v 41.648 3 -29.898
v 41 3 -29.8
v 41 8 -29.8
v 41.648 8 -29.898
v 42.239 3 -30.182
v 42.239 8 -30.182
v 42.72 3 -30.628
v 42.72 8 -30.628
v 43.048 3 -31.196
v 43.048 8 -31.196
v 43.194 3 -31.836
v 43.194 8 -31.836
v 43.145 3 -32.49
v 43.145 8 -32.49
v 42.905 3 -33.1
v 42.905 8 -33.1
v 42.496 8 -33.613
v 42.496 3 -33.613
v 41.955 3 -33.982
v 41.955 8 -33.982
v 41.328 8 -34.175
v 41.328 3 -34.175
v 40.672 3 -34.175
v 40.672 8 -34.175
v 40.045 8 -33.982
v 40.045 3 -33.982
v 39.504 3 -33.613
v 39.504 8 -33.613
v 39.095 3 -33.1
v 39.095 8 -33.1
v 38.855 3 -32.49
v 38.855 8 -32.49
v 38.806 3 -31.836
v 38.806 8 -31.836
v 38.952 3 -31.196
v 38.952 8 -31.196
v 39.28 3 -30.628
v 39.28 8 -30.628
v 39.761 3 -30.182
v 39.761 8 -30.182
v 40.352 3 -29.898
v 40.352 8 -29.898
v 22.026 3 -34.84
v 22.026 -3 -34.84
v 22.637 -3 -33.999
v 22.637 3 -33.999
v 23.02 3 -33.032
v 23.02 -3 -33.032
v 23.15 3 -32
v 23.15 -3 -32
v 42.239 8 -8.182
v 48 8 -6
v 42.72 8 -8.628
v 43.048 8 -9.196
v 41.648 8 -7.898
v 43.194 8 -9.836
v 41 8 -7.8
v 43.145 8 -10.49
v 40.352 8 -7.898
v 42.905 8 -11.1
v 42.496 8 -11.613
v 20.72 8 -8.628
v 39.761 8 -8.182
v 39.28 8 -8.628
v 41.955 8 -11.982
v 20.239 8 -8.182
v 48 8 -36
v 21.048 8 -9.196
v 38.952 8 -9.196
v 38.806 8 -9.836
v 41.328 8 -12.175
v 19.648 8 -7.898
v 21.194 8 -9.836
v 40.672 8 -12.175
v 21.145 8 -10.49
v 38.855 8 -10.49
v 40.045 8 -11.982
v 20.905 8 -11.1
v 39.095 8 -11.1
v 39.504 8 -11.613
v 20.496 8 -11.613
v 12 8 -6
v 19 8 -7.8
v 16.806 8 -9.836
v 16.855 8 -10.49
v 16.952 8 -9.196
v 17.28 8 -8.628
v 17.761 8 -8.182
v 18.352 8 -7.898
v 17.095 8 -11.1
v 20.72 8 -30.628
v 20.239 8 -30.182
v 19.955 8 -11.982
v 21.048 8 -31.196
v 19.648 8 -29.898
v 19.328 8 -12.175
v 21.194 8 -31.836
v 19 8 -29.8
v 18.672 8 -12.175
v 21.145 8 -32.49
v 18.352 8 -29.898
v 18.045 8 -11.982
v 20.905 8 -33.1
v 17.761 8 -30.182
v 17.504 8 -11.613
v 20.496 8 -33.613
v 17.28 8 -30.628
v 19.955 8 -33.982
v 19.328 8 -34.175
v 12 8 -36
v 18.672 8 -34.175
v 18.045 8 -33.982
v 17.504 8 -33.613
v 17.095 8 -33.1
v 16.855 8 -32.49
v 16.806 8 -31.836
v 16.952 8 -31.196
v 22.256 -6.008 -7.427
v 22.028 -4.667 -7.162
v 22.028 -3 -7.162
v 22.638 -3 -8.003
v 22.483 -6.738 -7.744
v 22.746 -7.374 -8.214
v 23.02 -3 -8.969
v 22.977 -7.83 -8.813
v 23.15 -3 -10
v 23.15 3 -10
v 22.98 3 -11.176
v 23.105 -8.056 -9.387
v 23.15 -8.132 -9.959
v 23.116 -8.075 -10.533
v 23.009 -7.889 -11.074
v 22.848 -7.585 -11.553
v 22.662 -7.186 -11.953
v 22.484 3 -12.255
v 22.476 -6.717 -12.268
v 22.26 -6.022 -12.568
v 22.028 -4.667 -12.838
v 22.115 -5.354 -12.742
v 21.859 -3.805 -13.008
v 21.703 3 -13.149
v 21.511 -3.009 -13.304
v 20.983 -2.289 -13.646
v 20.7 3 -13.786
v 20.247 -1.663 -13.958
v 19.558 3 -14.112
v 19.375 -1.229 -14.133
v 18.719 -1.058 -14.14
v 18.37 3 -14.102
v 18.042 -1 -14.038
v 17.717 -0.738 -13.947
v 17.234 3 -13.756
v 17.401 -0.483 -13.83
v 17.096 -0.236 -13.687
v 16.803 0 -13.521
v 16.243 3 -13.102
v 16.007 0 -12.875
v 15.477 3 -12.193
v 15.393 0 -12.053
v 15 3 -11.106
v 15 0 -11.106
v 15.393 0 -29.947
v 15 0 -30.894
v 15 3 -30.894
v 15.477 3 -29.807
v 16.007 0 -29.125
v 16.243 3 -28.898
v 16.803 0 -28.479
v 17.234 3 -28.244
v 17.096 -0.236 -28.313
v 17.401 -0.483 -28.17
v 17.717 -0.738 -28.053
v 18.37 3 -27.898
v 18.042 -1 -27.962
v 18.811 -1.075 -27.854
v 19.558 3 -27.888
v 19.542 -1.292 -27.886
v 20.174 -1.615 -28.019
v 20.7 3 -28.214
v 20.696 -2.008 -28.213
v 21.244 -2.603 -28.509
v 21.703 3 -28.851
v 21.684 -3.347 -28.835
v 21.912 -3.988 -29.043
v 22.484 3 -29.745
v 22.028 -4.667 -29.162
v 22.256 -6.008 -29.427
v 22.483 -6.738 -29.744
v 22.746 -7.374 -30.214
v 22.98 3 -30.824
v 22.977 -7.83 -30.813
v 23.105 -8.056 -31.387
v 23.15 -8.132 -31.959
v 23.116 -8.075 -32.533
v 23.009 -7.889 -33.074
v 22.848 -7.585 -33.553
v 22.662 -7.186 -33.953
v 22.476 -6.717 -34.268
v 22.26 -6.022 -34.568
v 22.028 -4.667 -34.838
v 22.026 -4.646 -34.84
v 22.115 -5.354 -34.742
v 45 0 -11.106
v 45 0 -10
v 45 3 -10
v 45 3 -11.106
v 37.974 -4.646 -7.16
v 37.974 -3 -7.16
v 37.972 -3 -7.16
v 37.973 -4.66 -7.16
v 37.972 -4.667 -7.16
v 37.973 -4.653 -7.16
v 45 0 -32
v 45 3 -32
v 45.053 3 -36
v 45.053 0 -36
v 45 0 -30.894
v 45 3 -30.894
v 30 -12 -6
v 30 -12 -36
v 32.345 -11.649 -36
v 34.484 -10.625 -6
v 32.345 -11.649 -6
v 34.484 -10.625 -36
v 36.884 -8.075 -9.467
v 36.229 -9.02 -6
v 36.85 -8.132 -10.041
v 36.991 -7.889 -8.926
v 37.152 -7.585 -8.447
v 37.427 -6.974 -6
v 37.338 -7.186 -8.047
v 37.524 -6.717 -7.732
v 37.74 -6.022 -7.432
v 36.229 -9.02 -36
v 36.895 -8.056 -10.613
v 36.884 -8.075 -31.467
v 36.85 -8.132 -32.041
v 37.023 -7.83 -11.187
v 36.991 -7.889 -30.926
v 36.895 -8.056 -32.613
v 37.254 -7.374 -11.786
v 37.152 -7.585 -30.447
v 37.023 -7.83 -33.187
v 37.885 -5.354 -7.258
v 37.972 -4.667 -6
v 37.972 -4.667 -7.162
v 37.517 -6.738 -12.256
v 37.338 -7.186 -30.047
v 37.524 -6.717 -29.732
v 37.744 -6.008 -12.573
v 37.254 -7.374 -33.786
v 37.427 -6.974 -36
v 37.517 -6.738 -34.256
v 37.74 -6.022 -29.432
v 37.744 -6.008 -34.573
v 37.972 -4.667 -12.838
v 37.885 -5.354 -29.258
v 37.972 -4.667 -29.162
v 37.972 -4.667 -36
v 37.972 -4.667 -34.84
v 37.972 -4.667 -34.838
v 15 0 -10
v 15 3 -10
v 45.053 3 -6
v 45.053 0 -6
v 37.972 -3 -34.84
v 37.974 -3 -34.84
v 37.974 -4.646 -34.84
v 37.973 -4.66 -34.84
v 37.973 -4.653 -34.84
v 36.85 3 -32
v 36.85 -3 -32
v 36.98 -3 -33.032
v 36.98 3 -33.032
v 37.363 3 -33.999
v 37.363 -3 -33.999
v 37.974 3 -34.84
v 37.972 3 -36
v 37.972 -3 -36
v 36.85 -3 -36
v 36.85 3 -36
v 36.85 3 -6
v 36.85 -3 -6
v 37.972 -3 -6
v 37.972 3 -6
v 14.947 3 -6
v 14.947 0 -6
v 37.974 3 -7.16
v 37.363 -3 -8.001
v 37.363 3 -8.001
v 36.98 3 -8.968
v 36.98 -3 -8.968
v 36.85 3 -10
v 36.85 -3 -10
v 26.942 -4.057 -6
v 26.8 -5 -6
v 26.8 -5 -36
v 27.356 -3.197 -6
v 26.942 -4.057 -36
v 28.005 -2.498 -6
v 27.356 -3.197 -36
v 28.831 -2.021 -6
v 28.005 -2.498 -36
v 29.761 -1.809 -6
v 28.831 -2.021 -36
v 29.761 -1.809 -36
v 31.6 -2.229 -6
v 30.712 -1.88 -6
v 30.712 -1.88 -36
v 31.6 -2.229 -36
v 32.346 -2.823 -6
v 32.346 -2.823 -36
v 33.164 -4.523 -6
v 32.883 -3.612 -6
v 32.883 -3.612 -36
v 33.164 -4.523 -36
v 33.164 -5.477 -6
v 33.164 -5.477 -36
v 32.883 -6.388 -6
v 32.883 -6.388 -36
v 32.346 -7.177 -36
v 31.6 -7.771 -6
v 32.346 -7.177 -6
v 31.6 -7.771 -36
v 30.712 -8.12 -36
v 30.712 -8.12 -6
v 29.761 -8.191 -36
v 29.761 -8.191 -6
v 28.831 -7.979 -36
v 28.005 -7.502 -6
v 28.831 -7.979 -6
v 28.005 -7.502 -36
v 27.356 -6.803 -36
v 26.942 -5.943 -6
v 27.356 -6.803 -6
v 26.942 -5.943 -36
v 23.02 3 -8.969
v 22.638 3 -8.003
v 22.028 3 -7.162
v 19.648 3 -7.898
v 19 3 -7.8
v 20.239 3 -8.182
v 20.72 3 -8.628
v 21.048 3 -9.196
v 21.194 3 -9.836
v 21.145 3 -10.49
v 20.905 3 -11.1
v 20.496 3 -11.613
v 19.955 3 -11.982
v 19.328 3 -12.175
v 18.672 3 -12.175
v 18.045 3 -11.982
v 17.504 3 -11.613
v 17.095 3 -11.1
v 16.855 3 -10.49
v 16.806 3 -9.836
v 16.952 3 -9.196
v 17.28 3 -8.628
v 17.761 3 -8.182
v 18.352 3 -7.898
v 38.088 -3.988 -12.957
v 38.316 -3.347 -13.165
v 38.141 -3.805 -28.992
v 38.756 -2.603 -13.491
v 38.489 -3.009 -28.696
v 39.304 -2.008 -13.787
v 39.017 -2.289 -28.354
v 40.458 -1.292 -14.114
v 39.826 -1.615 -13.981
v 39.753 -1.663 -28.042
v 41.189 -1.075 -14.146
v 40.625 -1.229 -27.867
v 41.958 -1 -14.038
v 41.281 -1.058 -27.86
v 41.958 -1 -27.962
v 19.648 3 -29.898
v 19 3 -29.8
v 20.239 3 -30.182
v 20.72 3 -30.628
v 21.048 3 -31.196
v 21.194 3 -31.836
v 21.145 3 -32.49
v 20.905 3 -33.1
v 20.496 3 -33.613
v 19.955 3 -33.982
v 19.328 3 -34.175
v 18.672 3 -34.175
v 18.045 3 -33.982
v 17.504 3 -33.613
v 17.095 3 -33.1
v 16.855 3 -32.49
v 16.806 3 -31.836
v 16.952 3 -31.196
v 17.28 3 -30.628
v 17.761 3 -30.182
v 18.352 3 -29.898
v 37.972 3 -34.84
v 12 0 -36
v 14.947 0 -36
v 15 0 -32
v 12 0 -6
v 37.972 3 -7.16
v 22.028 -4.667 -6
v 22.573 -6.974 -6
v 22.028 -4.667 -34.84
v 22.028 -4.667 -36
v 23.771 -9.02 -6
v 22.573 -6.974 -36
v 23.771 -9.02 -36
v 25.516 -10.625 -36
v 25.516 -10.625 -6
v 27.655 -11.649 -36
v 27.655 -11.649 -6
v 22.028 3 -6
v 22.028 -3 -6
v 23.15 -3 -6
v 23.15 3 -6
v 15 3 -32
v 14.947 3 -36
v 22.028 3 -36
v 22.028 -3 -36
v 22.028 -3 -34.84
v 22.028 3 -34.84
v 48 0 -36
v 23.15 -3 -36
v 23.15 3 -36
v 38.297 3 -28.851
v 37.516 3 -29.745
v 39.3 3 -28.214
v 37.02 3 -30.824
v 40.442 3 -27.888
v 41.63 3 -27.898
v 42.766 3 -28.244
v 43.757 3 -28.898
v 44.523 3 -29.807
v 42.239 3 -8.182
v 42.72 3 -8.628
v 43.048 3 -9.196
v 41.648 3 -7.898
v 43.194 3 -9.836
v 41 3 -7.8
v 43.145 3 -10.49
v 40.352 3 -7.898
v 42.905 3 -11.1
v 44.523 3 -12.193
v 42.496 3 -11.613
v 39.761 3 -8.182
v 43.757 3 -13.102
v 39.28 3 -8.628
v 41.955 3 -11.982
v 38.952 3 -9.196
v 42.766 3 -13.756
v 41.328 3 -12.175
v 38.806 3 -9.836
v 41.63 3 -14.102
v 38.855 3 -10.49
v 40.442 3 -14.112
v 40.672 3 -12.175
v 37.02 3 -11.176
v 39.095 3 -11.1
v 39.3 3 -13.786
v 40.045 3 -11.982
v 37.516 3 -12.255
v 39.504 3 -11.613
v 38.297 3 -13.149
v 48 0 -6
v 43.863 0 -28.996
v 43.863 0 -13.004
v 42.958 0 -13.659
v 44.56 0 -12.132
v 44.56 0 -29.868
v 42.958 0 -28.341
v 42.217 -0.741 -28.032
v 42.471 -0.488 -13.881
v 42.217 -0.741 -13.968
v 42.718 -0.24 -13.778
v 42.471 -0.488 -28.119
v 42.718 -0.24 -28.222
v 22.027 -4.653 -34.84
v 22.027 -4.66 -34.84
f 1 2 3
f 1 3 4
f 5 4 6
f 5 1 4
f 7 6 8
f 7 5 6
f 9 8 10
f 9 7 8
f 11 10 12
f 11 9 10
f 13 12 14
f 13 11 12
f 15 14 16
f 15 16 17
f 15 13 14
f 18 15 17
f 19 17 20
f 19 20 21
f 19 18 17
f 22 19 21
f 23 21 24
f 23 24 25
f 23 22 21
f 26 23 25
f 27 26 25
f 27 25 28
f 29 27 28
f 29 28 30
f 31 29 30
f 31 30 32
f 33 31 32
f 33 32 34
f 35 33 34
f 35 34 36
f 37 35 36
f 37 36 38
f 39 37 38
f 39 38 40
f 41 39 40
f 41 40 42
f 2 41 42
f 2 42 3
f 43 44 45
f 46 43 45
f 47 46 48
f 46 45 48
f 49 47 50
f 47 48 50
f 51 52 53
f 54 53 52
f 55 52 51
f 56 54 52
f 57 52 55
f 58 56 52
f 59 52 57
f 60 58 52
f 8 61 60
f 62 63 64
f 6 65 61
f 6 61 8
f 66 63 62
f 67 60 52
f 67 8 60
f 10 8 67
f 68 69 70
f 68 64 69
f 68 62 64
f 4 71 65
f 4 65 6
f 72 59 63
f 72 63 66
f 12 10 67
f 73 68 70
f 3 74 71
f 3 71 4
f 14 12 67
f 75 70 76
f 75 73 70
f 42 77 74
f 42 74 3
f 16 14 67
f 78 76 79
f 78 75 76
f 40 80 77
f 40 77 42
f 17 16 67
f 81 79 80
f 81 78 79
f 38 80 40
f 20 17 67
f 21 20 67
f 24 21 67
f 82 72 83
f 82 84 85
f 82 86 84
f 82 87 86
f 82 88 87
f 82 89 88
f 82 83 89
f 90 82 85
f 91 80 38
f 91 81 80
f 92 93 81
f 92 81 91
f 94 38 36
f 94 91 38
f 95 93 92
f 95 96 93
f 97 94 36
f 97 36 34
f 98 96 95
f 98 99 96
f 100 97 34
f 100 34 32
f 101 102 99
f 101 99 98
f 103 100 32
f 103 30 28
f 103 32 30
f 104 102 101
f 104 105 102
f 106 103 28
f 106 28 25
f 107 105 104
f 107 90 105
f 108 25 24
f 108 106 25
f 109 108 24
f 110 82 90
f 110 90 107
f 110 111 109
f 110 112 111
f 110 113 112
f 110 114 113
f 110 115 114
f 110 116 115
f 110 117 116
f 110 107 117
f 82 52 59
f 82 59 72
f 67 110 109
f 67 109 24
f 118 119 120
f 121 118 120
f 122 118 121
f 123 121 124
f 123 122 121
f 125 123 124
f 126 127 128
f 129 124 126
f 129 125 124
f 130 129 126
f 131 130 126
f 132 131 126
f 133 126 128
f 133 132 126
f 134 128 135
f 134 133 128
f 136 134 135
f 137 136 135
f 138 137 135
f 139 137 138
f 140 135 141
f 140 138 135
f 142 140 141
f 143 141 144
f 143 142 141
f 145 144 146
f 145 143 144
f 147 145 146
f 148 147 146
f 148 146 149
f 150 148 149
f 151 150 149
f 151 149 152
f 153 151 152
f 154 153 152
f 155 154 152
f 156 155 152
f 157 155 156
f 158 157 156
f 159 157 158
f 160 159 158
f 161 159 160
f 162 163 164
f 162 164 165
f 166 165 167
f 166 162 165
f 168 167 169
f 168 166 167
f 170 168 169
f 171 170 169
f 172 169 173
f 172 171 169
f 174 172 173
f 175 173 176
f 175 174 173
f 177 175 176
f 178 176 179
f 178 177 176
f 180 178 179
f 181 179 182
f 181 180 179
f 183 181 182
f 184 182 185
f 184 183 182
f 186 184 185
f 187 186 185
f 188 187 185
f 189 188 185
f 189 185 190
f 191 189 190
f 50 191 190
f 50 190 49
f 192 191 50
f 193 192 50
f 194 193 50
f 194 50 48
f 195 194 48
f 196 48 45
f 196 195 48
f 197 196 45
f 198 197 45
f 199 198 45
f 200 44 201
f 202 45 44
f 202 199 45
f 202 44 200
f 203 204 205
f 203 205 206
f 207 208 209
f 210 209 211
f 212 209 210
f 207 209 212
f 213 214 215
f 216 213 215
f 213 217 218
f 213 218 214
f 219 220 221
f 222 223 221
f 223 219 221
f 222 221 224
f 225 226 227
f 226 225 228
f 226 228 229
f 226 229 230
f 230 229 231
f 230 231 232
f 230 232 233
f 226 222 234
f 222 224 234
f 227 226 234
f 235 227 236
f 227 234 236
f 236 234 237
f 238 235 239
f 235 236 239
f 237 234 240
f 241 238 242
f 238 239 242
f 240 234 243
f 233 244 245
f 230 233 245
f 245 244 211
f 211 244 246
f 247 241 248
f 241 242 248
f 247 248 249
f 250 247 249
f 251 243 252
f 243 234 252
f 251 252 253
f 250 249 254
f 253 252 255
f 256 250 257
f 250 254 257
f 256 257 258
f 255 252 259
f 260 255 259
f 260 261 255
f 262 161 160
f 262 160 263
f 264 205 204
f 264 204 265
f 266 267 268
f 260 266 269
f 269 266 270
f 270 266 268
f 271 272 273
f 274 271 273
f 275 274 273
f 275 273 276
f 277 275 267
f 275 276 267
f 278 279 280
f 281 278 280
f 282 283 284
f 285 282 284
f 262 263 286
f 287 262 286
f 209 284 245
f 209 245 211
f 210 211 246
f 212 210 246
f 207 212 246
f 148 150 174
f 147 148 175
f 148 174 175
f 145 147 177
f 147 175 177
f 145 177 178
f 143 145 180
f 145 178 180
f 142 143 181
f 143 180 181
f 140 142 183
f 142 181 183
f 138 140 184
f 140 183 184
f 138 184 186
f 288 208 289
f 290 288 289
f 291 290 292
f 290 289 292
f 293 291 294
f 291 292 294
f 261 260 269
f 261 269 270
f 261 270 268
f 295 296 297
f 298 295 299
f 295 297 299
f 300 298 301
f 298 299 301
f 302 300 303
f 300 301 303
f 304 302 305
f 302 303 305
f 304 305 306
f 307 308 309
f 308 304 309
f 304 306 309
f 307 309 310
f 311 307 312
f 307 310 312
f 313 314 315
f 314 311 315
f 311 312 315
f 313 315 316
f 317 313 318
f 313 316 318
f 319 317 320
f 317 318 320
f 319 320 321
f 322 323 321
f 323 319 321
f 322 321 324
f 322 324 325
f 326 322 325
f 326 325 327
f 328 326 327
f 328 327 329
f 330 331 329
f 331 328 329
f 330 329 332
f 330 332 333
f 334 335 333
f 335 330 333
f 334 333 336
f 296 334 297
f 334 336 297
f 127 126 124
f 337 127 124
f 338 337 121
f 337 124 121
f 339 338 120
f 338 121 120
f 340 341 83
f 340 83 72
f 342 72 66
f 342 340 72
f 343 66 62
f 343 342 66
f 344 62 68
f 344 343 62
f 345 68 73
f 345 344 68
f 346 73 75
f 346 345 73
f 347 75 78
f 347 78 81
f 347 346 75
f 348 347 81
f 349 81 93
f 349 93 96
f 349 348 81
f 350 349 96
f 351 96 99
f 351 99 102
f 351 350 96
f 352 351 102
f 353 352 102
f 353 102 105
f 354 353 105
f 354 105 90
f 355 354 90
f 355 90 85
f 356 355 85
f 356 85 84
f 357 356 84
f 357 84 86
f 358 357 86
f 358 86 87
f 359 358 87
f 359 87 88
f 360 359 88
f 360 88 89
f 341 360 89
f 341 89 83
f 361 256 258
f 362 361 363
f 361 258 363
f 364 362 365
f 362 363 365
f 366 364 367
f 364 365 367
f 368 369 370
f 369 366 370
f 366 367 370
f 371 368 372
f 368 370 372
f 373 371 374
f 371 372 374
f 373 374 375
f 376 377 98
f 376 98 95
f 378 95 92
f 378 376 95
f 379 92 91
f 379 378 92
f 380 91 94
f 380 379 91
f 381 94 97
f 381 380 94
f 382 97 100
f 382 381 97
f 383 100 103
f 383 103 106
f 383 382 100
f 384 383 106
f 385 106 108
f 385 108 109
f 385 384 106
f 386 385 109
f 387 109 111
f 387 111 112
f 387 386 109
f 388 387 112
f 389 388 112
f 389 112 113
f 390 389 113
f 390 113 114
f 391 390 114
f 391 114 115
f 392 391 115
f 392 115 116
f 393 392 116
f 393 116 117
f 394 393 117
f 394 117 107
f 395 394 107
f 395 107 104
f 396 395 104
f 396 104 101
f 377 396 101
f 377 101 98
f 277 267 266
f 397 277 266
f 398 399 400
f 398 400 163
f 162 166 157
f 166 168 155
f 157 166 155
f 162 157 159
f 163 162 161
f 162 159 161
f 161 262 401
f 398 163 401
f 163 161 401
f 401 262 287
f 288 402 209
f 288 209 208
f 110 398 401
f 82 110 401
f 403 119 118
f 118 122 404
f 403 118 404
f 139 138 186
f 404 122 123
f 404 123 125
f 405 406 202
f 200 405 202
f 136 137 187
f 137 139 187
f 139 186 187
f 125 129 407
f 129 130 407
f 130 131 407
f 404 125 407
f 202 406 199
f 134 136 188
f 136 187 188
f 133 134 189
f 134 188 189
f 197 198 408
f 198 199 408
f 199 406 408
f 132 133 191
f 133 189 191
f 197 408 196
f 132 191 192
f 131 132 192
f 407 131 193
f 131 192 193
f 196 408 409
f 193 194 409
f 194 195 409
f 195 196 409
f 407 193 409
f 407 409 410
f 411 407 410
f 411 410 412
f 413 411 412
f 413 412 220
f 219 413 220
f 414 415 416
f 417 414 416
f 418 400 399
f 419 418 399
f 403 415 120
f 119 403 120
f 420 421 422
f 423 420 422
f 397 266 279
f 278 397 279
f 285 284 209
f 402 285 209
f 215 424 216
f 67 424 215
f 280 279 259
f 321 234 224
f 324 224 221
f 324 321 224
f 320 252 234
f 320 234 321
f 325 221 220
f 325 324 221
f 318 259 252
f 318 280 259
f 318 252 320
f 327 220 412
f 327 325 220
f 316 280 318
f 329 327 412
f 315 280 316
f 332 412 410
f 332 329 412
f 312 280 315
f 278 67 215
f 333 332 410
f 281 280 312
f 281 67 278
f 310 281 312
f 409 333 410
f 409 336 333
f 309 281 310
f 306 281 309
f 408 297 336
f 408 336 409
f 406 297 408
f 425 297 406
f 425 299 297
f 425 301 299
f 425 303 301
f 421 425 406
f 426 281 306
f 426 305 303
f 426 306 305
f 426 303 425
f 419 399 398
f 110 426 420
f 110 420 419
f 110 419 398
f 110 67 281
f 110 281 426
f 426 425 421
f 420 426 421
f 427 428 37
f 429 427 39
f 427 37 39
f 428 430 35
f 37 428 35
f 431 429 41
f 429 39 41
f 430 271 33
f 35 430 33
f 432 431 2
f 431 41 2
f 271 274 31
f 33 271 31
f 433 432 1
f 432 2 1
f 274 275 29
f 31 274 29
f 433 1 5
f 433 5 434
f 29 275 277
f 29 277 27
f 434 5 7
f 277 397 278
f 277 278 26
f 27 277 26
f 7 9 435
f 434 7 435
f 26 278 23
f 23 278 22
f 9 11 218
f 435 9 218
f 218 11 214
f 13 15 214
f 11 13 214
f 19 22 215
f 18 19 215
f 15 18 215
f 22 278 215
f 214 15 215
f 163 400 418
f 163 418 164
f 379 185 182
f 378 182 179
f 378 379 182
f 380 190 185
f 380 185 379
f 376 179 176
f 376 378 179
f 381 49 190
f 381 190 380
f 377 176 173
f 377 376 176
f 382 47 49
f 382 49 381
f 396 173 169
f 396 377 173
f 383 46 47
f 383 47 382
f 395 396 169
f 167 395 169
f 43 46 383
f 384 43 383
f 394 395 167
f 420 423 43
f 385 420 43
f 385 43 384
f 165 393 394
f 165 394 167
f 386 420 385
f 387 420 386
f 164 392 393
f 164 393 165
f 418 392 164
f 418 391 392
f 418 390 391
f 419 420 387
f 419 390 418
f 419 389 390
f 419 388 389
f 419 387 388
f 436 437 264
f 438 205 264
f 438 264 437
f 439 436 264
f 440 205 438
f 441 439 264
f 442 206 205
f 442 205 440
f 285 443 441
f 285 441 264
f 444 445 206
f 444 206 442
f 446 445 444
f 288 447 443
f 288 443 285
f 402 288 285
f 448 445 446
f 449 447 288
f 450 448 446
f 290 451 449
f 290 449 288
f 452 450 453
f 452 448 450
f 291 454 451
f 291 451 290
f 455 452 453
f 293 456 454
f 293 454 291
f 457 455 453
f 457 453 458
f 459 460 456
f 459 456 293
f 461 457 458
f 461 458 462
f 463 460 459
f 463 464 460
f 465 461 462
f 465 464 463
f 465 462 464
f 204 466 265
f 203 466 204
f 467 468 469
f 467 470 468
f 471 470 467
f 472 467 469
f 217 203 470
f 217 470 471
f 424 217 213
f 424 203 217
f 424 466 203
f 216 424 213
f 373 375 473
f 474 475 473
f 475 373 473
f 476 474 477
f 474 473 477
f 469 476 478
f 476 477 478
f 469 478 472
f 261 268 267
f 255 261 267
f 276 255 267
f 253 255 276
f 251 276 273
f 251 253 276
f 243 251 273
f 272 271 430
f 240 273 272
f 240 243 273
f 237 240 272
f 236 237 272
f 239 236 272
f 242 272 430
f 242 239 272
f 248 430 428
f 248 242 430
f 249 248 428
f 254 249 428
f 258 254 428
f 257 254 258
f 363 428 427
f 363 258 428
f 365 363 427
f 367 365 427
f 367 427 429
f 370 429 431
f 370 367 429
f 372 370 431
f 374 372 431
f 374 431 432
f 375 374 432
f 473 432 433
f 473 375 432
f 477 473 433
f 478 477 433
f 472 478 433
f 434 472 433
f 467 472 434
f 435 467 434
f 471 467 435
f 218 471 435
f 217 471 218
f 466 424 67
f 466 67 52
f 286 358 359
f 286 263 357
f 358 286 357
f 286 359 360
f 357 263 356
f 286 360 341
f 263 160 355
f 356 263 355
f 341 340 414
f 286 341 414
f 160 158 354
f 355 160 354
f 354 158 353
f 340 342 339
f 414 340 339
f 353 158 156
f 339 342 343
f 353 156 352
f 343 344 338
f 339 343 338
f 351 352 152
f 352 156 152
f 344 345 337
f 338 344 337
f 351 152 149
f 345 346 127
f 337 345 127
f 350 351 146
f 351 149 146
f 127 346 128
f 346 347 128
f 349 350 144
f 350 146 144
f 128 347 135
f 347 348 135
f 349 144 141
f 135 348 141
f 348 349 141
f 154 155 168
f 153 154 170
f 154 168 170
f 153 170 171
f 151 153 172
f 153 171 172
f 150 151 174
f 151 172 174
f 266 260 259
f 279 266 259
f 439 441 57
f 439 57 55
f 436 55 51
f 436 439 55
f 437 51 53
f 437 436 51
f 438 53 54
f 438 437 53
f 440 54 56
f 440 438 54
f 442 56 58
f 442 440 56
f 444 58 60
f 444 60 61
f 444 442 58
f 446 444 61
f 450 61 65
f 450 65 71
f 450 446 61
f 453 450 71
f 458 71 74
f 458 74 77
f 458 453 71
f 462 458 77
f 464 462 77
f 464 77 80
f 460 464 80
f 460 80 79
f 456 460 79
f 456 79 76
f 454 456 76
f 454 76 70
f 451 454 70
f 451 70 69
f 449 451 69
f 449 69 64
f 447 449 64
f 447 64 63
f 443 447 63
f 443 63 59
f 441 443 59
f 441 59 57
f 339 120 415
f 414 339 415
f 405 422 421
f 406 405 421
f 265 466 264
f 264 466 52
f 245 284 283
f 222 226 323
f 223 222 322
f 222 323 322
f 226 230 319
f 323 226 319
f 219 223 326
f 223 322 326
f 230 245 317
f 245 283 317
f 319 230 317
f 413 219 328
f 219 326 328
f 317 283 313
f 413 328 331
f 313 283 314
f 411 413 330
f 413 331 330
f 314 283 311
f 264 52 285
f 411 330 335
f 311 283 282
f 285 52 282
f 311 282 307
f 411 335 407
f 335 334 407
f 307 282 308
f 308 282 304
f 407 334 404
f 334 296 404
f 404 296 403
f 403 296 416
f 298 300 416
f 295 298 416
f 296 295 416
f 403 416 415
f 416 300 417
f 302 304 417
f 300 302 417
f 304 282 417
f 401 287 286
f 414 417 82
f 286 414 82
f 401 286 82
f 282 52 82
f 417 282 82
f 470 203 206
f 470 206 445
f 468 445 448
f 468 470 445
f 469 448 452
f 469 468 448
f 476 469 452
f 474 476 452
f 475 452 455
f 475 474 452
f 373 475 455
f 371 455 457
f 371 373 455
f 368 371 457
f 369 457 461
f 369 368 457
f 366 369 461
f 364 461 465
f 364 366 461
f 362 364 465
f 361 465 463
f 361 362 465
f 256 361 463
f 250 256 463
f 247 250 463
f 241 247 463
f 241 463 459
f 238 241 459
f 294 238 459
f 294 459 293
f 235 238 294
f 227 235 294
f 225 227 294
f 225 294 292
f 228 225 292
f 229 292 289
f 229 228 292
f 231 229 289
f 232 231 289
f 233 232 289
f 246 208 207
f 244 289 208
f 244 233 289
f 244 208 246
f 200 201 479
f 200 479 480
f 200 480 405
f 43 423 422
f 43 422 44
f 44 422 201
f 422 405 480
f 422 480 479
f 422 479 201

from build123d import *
from build123d.topology import SkipClean

# Parameters (mm, degrees)
SKETCH1_W            = 60
SKETCH1_H            = 42
BOSS_EXTRUDE1_DEPTH  = 8
SKETCH3_W            = 10
SKETCH3_H            = 42
BOSS_EXTRUDE5_DEPTH  = 6
SKETCH5_W            = 14
SKETCH5_H            = 42
BOSS_EXTRUDE6_DEPTH  = 11
SKETCH6_R            = 3.2
CUT_EXTRUDE1_DEPTH   = 75.565407529
FILLET1_R            = 7
FILLET2_R            = 5
FILLET3_R            = 5
BOSS_EXTRUDE7_DEPTH  = 42
SKETCH9_W            = 5
SKETCH9_H            = 42
BOSS_EXTRUDE8_DEPTH  = 6
SKETCH11_W           = 15
SKETCH11_H           = 42
CUT_EXTRUDE2_DEPTH   = 76.921011584
SKETCH12_W           = 30
SKETCH12_H           = 42
CUT_EXTRUDE3_DEPTH   = 6
SKETCH15_W           = 42
SKETCH15_H           = 8
BOSS_EXTRUDE9_DEPTH  = 5
SKETCH16_W           = 42
SKETCH16_H           = 8
BOSS_EXTRUDE10_DEPTH = 5
CUT_EXTRUDE7_START   = -17
CUT_EXTRUDE7_DEPTH   = 17
BOSS_EXTRUDE11_START = -5
SKETCH17_R           = 4.15
SKETCH17_R_2         = 2.2
BOSS_EXTRUDE11_DEPTH = 5
SKETCH18_W           = 2
SKETCH18_H           = 42
CUT_EXTRUDE8_DEPTH   = 67.392770772
CUT_EXTRUDE9_START   = -6
SKETCH19_R           = 3.2
CUT_EXTRUDE9_DEPTH   = 6
CUT_EXTRUDE10_DEPTH  = 6
SKETCH21_W           = 6.443242803
SKETCH21_H           = 1.161907564
SKETCH21_W_2         = 5.84761327
SKETCH21_H_2         = 1.16
SKETCH21_W_3         = 6.146169824
CUT_EXTRUDE11_DEPTH  = 6
CUT_EXTRUDE12_DEPTH  = 3
BOSS_EXTRUDE12_DEPTH = 6
BOSS_EXTRUDE13_DEPTH = 6


with BuildPart() as part:
    # Sketch1 → Boss-Extrude1 (new body)
    with BuildSketch(Plane(origin=(0, 0, 0), x_dir=(1, 0, 0), z_dir=(0, 1, 0))):
        with Locations((30, 21)):
            Rectangle(SKETCH1_W, SKETCH1_H)
    extrude(amount=BOSS_EXTRUDE1_DEPTH)

    # Sketch3 → Boss-Extrude5 (add)
    with BuildSketch(Plane(origin=(0, 8, 0), x_dir=(1, 0, 0), z_dir=(0, 1, 0))):
        with Locations((30, 21)):
            Rectangle(SKETCH3_W, SKETCH3_H)
    extrude(amount=BOSS_EXTRUDE5_DEPTH)

    # Sketch5 → Boss-Extrude6 (add)
    with BuildSketch(Plane.XZ):
        with Locations((30, -21)):
            Rectangle(SKETCH5_W, SKETCH5_H)
    extrude(amount=BOSS_EXTRUDE6_DEPTH)

    # Sketch6 → Cut-Extrude1 (cut, through all)
    with BuildSketch(Plane(origin=(0, 0, -42), x_dir=(-1, 0, 0), z_dir=(0, 0, -1))):
        with Locations((-30, -5)):
            Circle(SKETCH6_R)
    extrude(amount=-CUT_EXTRUDE1_DEPTH, mode=Mode.SUBTRACT)

    # Fillet1
    fillet1_edges = [part.edges().sort_by_distance(p)[0] for p in [
        (23, -11, -21),
        (37, -11, -21),
    ]]
    fillet(fillet1_edges, radius=FILLET1_R - 0.0001)  # a hair under: the kernel refuses the full size

    # Fillet2
    fillet2_edges = [part.edges().sort_by_distance(p)[0] for p in [
        (23, 0, -21),
    ]]
    fillet(fillet2_edges, radius=FILLET2_R)

    # Fillet3
    fillet3_edges = [part.edges().sort_by_distance(p)[0] for p in [
        (37, 0, -21),
    ]]
    fillet(fillet3_edges, radius=FILLET3_R)

    # Sketch8 → Boss-Extrude7 (add)
    with BuildSketch(Plane(origin=(0, 0, -42), x_dir=(-1, 0, 0), z_dir=(0, 0, -1))):
        with BuildLine():
            Line((-41.958260743, -1), (-42.958260743, 0))
            Line((-42.958260743, 0), (-41.958260743, 0))
            ThreePointArc((-41.958260743, 0), (-38.573244741, -1.320099639), (-36.9756521, -4.583333333))
            ThreePointArc((-36.9756521, -4.583333333), (-34.739022403, -9.151860505), (-30, -11))
            ThreePointArc((-30, -11), (-25.260977597, -9.151860505), (-23.0243479, -4.583333333))
            ThreePointArc((-23.0243479, -4.583333333), (-21.426755259, -1.320099639), (-18.041739257, 0))
            Line((-18.041739257, 0), (-16.803044796, 0))
            Line((-16.803044796, 0), (-18.041739257, -1))
            ThreePointArc((-18.041739257, -1), (-20.749752058, -2.056079711), (-22.027826171, -4.666666667))
            ThreePointArc((-22.027826171, -4.666666667), (-24.583974397, -9.887840578), (-30, -12))
            ThreePointArc((-30, -12), (-35.416025603, -9.887840578), (-37.972173829, -4.666666667))
            ThreePointArc((-37.972173829, -4.666666667), (-39.250247942, -2.056079711), (-41.958260743, -1))
        make_face()
    extrude(amount=-BOSS_EXTRUDE7_DEPTH)

    # Sketch9 → Boss-Extrude8 (add)
    with BuildSketch(Plane(origin=(0, 8, 0), x_dir=(1, 0, 0), z_dir=(0, 1, 0))):
        with Locations((42.5, 21)):
            Rectangle(SKETCH9_W, SKETCH9_H)
        with Locations((17.5, 21)):
            Rectangle(SKETCH9_W, SKETCH9_H)
    extrude(amount=BOSS_EXTRUDE8_DEPTH)

    # Sketch11 → Cut-Extrude2 (cut, through all)
    with BuildSketch(Plane(origin=(0, 8, 0), x_dir=(1, 0, 0), z_dir=(0, 1, 0))):
        with Locations((52.5, 21)):
            Rectangle(SKETCH11_W, SKETCH11_H)
        with Locations((7.5, 21)):
            Rectangle(SKETCH11_W, SKETCH11_H)
    extrude(amount=-CUT_EXTRUDE2_DEPTH, mode=Mode.SUBTRACT)

    # Sketch12 → Cut-Extrude3 (cut)
    with BuildSketch(Plane(origin=(0, 14, 0), x_dir=(1, 0, 0), z_dir=(0, 1, 0))):
        with Locations((30, 21)):
            Rectangle(SKETCH12_W, SKETCH12_H)
    extrude(amount=-CUT_EXTRUDE3_DEPTH, mode=Mode.SUBTRACT)

    # Sketch15 → Boss-Extrude9 (add)
    with BuildSketch(Plane.ZY.offset(-15)):
        with Locations((-21, 4)):
            Rectangle(SKETCH15_W, SKETCH15_H)
    extrude(amount=BOSS_EXTRUDE9_DEPTH)

    # Sketch16 → Boss-Extrude10 (add)
    with BuildSketch(Plane(origin=(45, 0, 0), x_dir=(0, 0, -1), z_dir=(1, 0, 0))):
        with Locations((21, 4)):
            Rectangle(SKETCH16_W, SKETCH16_H)
    extrude(amount=BOSS_EXTRUDE10_DEPTH)

    # Cut-Extrude7: read off the stored shape, not the designer's step
    # Cut-Extrude7 outline → Cut-Extrude7 (cut)
    with BuildSketch(Plane(origin=(0, 8, 0), x_dir=(1, 0, 0), z_dir=(0, 1, 0)).offset(CUT_EXTRUDE7_START)):
        with BuildLine():
            ThreePointArc((45, 33.105667219), (36.85, 32), (45, 30.894332781))
            Line((45, 30.894332781), (45, 33.105667219))
        make_face()
        with BuildLine():
            ThreePointArc((45, 11.105667219), (36.85, 10), (45, 8.894332781))
            Line((45, 8.894332781), (45, 11.105667219))
        make_face()
        with BuildLine():
            ThreePointArc((15, 8.894332781), (23.15, 10), (15, 11.105667219))
            Line((15, 11.105667219), (15, 8.894332781))
        make_face()
        with BuildLine():
            ThreePointArc((15, 30.894332781), (23.15, 32), (15, 33.105667219))
            Line((15, 33.105667219), (15, 30.894332781))
        make_face()
    extrude(amount=CUT_EXTRUDE7_DEPTH, mode=Mode.SUBTRACT)

    # Sketch17 → Boss-Extrude11 (add)
    # profile 1 of 4: a face of its own
    with BuildSketch(Plane(origin=(0, 8, 0), x_dir=(1, 0, 0), z_dir=(0, 1, 0)).offset(BOSS_EXTRUDE11_START)):
        with Locations((41, 32)):
            Circle(SKETCH17_R)
        with Locations(Location((41, 32, 0), (0, 0, 270))):
            Circle(SKETCH17_R_2, mode=Mode.SUBTRACT)
    # profile 2 of 4: a face of its own
    with BuildSketch(Plane(origin=(0, 8, 0), x_dir=(1, 0, 0), z_dir=(0, 1, 0)).offset(BOSS_EXTRUDE11_START)):
        with Locations((19, 10)):
            Circle(SKETCH17_R)
        with Locations(Location((19, 10, 0), (0, 0, 270))):
            Circle(SKETCH17_R_2, mode=Mode.SUBTRACT)
    # profile 3 of 4: a face of its own
    with BuildSketch(Plane(origin=(0, 8, 0), x_dir=(1, 0, 0), z_dir=(0, 1, 0)).offset(BOSS_EXTRUDE11_START)):
        with Locations((41, 10)):
            Circle(SKETCH17_R)
        with Locations(Location((41, 10, 0), (0, 0, 270))):
            Circle(SKETCH17_R_2, mode=Mode.SUBTRACT)
    # profile 4 of 4: a face of its own
    with BuildSketch(Plane(origin=(0, 8, 0), x_dir=(1, 0, 0), z_dir=(0, 1, 0)).offset(BOSS_EXTRUDE11_START)):
        with Locations((19, 32)):
            Circle(SKETCH17_R)
        with Locations(Location((19, 32, 0), (0, 0, 270))):
            Circle(SKETCH17_R_2, mode=Mode.SUBTRACT)
    extrude(amount=BOSS_EXTRUDE11_DEPTH)

    # Sketch18 → Cut-Extrude8 (cut, through all)
    with BuildSketch(Plane.XZ):
        with Locations((11, -21)):
            Rectangle(SKETCH18_W, SKETCH18_H)
        with Locations((49, -21)):
            Rectangle(SKETCH18_W, SKETCH18_H)
    extrude(amount=-CUT_EXTRUDE8_DEPTH, mode=Mode.SUBTRACT)

    # Sketch19 → Cut-Extrude9 (cut)
    with BuildSketch(Plane.XY.offset(CUT_EXTRUDE9_START)):
        with BuildLine():
            Line((48, 8), (48, 0))
            Line((48, 0), (42.958260743, 0))
            Line((42.958260743, 0), (41.958260743, -1))
            ThreePointArc((41.958260743, -1), (39.250247942, -2.056079711), (37.972173829, -4.666666667))
            ThreePointArc((37.972173829, -4.666666667), (30, -12), (22.027826171, -4.666666667))
            ThreePointArc((22.027826171, -4.666666667), (20.749752058, -2.056079711), (18.041739257, -1))
            Line((18.041739257, -1), (16.803044796, 0))
            Line((16.803044796, 0), (12, 0))
            Line((12, 0), (12, 8))
            Line((12, 8), (48, 8))
        make_face()
        with Locations(Location((30, -5, 0), (0, 0, 180))):
            Circle(SKETCH19_R, mode=Mode.SUBTRACT)
    extrude(amount=CUT_EXTRUDE9_DEPTH, mode=Mode.SUBTRACT)

    # Sketch20 → Cut-Extrude10 (cut)
    with BuildSketch(Plane(origin=(0, 0, -42), x_dir=(-1, 0, 0), z_dir=(0, 0, -1))):
        with BuildLine():
            Line((-16.803044796, 0), (-12, 0))
            Line((-12, 0), (-12, 8))
            Line((-12, 8), (-48, 8))
            Line((-48, 8), (-48, 0))
            Line((-48, 0), (-42.958260743, 0))
            Line((-42.958260743, 0), (-41.958260743, -1))
            ThreePointArc((-41.958260743, -1), (-39.250247942, -2.056079711), (-37.972173829, -4.666666667))
            ThreePointArc((-37.972173829, -4.666666667), (-30, -12), (-22.027826171, -4.666666667))
            ThreePointArc((-22.027826171, -4.666666667), (-20.749752058, -2.056079711), (-18.041739257, -1))
            Line((-18.041739257, -1), (-16.803044796, 0))
        make_face()
    extrude(amount=-CUT_EXTRUDE10_DEPTH, mode=Mode.SUBTRACT)

    # Sketch21 → Cut-Extrude11 (cut)
    with BuildSketch(Plane(origin=(0, 0, 0), x_dir=(-1, 0, 0), z_dir=(0, -1, 0))):
        with Locations((-18.806204769, 6.580953782)):
            Rectangle(SKETCH21_W, SKETCH21_H)
        with Locations((-19.104019536, 35.42)):
            Rectangle(SKETCH21_W_2, SKETCH21_H_2)
        with Locations((-41.045258741, 6.58)):
            Rectangle(SKETCH21_W_3, SKETCH21_H_2)
        with Locations((-41.045258741, 35.42)):
            Rectangle(SKETCH21_W_3, SKETCH21_H_2)
    extrude(amount=CUT_EXTRUDE11_DEPTH, mode=Mode.SUBTRACT)

    # Sketch22 → Cut-Extrude12 (cut, symmetric)
    with BuildSketch(Plane(origin=(0, 0, 0), x_dir=(-1, 0, 0), z_dir=(0, -1, 0))):
        Polygon((-36.85, 10), (-45, 10), (-45.05283361, 6), (-36.85, 6), align=None)
        Polygon((-45.05283361, 36), (-36.85, 36), (-36.85, 32), (-45, 32), align=None)
        Polygon((-14.94716639, 6), (-23.15, 6), (-23.15, 10), (-15, 10), align=None)
        Polygon((-15, 32), (-14.94716639, 36), (-23.15, 36), (-23.15, 32), align=None)
    extrude(amount=CUT_EXTRUDE12_DEPTH, both=True, mode=Mode.SUBTRACT)

    # Sketch24 → Boss-Extrude12 (add)
    with SkipClean():  # the faces are left unmerged after this step: merging them gives an invalid solid
        with BuildSketch(Plane(origin=(0, -3, 0), x_dir=(1, 0, 0), z_dir=(0, 1, 0))):
            with BuildLine():
                Line((22.027826171, 34.84), (22.026037012, 34.84))
                ThreePointArc((22.026037012, 34.84), (22.858792143, 33.527161812), (23.15, 32))
                Line((23.15, 32), (23.15, 36))
                Line((23.15, 36), (22.027826171, 36))
                Line((22.027826171, 36), (22.027826171, 34.84))
            make_face()
        extrude(amount=BOSS_EXTRUDE12_DEPTH)

    # Sketch25 → Boss-Extrude13 (add)
    with SkipClean():  # the faces are left unmerged after this step: merging them gives an invalid solid
        with BuildSketch(Plane(origin=(0, -3, 0), x_dir=(1, 0, 0), z_dir=(0, 1, 0))):
            with BuildLine():
                Line((37.973962988, 34.84), (37.972173829, 34.84))
                Line((37.972173829, 34.84), (37.972173829, 36))
                Line((37.972173829, 36), (36.85, 36))
                Line((36.85, 36), (36.85, 32))
                ThreePointArc((36.85, 32), (37.141207857, 33.527161812), (37.973962988, 34.84))
            make_face()
            with BuildLine():
                Line((36.85, 10), (36.85, 6))
                Line((36.85, 6), (37.972173829, 6))
                Line((37.972173829, 6), (37.972173829, 7.16))
                Line((37.972173829, 7.16), (37.973962988, 7.16))
                ThreePointArc((37.973962988, 7.16), (37.141207857, 8.472838188), (36.85, 10))
            make_face()
            with BuildLine():
                Line((22.027826171, 7.161907564), (22.027826171, 6))
                Line((22.027826171, 6), (23.15, 6))
                Line((23.15, 6), (23.15, 10))
                ThreePointArc((23.15, 10), (22.859273158, 8.474054164), (22.027826171, 7.161907564))
            make_face()
        extrude(amount=BOSS_EXTRUDE13_DEPTH)


solid = part.part
